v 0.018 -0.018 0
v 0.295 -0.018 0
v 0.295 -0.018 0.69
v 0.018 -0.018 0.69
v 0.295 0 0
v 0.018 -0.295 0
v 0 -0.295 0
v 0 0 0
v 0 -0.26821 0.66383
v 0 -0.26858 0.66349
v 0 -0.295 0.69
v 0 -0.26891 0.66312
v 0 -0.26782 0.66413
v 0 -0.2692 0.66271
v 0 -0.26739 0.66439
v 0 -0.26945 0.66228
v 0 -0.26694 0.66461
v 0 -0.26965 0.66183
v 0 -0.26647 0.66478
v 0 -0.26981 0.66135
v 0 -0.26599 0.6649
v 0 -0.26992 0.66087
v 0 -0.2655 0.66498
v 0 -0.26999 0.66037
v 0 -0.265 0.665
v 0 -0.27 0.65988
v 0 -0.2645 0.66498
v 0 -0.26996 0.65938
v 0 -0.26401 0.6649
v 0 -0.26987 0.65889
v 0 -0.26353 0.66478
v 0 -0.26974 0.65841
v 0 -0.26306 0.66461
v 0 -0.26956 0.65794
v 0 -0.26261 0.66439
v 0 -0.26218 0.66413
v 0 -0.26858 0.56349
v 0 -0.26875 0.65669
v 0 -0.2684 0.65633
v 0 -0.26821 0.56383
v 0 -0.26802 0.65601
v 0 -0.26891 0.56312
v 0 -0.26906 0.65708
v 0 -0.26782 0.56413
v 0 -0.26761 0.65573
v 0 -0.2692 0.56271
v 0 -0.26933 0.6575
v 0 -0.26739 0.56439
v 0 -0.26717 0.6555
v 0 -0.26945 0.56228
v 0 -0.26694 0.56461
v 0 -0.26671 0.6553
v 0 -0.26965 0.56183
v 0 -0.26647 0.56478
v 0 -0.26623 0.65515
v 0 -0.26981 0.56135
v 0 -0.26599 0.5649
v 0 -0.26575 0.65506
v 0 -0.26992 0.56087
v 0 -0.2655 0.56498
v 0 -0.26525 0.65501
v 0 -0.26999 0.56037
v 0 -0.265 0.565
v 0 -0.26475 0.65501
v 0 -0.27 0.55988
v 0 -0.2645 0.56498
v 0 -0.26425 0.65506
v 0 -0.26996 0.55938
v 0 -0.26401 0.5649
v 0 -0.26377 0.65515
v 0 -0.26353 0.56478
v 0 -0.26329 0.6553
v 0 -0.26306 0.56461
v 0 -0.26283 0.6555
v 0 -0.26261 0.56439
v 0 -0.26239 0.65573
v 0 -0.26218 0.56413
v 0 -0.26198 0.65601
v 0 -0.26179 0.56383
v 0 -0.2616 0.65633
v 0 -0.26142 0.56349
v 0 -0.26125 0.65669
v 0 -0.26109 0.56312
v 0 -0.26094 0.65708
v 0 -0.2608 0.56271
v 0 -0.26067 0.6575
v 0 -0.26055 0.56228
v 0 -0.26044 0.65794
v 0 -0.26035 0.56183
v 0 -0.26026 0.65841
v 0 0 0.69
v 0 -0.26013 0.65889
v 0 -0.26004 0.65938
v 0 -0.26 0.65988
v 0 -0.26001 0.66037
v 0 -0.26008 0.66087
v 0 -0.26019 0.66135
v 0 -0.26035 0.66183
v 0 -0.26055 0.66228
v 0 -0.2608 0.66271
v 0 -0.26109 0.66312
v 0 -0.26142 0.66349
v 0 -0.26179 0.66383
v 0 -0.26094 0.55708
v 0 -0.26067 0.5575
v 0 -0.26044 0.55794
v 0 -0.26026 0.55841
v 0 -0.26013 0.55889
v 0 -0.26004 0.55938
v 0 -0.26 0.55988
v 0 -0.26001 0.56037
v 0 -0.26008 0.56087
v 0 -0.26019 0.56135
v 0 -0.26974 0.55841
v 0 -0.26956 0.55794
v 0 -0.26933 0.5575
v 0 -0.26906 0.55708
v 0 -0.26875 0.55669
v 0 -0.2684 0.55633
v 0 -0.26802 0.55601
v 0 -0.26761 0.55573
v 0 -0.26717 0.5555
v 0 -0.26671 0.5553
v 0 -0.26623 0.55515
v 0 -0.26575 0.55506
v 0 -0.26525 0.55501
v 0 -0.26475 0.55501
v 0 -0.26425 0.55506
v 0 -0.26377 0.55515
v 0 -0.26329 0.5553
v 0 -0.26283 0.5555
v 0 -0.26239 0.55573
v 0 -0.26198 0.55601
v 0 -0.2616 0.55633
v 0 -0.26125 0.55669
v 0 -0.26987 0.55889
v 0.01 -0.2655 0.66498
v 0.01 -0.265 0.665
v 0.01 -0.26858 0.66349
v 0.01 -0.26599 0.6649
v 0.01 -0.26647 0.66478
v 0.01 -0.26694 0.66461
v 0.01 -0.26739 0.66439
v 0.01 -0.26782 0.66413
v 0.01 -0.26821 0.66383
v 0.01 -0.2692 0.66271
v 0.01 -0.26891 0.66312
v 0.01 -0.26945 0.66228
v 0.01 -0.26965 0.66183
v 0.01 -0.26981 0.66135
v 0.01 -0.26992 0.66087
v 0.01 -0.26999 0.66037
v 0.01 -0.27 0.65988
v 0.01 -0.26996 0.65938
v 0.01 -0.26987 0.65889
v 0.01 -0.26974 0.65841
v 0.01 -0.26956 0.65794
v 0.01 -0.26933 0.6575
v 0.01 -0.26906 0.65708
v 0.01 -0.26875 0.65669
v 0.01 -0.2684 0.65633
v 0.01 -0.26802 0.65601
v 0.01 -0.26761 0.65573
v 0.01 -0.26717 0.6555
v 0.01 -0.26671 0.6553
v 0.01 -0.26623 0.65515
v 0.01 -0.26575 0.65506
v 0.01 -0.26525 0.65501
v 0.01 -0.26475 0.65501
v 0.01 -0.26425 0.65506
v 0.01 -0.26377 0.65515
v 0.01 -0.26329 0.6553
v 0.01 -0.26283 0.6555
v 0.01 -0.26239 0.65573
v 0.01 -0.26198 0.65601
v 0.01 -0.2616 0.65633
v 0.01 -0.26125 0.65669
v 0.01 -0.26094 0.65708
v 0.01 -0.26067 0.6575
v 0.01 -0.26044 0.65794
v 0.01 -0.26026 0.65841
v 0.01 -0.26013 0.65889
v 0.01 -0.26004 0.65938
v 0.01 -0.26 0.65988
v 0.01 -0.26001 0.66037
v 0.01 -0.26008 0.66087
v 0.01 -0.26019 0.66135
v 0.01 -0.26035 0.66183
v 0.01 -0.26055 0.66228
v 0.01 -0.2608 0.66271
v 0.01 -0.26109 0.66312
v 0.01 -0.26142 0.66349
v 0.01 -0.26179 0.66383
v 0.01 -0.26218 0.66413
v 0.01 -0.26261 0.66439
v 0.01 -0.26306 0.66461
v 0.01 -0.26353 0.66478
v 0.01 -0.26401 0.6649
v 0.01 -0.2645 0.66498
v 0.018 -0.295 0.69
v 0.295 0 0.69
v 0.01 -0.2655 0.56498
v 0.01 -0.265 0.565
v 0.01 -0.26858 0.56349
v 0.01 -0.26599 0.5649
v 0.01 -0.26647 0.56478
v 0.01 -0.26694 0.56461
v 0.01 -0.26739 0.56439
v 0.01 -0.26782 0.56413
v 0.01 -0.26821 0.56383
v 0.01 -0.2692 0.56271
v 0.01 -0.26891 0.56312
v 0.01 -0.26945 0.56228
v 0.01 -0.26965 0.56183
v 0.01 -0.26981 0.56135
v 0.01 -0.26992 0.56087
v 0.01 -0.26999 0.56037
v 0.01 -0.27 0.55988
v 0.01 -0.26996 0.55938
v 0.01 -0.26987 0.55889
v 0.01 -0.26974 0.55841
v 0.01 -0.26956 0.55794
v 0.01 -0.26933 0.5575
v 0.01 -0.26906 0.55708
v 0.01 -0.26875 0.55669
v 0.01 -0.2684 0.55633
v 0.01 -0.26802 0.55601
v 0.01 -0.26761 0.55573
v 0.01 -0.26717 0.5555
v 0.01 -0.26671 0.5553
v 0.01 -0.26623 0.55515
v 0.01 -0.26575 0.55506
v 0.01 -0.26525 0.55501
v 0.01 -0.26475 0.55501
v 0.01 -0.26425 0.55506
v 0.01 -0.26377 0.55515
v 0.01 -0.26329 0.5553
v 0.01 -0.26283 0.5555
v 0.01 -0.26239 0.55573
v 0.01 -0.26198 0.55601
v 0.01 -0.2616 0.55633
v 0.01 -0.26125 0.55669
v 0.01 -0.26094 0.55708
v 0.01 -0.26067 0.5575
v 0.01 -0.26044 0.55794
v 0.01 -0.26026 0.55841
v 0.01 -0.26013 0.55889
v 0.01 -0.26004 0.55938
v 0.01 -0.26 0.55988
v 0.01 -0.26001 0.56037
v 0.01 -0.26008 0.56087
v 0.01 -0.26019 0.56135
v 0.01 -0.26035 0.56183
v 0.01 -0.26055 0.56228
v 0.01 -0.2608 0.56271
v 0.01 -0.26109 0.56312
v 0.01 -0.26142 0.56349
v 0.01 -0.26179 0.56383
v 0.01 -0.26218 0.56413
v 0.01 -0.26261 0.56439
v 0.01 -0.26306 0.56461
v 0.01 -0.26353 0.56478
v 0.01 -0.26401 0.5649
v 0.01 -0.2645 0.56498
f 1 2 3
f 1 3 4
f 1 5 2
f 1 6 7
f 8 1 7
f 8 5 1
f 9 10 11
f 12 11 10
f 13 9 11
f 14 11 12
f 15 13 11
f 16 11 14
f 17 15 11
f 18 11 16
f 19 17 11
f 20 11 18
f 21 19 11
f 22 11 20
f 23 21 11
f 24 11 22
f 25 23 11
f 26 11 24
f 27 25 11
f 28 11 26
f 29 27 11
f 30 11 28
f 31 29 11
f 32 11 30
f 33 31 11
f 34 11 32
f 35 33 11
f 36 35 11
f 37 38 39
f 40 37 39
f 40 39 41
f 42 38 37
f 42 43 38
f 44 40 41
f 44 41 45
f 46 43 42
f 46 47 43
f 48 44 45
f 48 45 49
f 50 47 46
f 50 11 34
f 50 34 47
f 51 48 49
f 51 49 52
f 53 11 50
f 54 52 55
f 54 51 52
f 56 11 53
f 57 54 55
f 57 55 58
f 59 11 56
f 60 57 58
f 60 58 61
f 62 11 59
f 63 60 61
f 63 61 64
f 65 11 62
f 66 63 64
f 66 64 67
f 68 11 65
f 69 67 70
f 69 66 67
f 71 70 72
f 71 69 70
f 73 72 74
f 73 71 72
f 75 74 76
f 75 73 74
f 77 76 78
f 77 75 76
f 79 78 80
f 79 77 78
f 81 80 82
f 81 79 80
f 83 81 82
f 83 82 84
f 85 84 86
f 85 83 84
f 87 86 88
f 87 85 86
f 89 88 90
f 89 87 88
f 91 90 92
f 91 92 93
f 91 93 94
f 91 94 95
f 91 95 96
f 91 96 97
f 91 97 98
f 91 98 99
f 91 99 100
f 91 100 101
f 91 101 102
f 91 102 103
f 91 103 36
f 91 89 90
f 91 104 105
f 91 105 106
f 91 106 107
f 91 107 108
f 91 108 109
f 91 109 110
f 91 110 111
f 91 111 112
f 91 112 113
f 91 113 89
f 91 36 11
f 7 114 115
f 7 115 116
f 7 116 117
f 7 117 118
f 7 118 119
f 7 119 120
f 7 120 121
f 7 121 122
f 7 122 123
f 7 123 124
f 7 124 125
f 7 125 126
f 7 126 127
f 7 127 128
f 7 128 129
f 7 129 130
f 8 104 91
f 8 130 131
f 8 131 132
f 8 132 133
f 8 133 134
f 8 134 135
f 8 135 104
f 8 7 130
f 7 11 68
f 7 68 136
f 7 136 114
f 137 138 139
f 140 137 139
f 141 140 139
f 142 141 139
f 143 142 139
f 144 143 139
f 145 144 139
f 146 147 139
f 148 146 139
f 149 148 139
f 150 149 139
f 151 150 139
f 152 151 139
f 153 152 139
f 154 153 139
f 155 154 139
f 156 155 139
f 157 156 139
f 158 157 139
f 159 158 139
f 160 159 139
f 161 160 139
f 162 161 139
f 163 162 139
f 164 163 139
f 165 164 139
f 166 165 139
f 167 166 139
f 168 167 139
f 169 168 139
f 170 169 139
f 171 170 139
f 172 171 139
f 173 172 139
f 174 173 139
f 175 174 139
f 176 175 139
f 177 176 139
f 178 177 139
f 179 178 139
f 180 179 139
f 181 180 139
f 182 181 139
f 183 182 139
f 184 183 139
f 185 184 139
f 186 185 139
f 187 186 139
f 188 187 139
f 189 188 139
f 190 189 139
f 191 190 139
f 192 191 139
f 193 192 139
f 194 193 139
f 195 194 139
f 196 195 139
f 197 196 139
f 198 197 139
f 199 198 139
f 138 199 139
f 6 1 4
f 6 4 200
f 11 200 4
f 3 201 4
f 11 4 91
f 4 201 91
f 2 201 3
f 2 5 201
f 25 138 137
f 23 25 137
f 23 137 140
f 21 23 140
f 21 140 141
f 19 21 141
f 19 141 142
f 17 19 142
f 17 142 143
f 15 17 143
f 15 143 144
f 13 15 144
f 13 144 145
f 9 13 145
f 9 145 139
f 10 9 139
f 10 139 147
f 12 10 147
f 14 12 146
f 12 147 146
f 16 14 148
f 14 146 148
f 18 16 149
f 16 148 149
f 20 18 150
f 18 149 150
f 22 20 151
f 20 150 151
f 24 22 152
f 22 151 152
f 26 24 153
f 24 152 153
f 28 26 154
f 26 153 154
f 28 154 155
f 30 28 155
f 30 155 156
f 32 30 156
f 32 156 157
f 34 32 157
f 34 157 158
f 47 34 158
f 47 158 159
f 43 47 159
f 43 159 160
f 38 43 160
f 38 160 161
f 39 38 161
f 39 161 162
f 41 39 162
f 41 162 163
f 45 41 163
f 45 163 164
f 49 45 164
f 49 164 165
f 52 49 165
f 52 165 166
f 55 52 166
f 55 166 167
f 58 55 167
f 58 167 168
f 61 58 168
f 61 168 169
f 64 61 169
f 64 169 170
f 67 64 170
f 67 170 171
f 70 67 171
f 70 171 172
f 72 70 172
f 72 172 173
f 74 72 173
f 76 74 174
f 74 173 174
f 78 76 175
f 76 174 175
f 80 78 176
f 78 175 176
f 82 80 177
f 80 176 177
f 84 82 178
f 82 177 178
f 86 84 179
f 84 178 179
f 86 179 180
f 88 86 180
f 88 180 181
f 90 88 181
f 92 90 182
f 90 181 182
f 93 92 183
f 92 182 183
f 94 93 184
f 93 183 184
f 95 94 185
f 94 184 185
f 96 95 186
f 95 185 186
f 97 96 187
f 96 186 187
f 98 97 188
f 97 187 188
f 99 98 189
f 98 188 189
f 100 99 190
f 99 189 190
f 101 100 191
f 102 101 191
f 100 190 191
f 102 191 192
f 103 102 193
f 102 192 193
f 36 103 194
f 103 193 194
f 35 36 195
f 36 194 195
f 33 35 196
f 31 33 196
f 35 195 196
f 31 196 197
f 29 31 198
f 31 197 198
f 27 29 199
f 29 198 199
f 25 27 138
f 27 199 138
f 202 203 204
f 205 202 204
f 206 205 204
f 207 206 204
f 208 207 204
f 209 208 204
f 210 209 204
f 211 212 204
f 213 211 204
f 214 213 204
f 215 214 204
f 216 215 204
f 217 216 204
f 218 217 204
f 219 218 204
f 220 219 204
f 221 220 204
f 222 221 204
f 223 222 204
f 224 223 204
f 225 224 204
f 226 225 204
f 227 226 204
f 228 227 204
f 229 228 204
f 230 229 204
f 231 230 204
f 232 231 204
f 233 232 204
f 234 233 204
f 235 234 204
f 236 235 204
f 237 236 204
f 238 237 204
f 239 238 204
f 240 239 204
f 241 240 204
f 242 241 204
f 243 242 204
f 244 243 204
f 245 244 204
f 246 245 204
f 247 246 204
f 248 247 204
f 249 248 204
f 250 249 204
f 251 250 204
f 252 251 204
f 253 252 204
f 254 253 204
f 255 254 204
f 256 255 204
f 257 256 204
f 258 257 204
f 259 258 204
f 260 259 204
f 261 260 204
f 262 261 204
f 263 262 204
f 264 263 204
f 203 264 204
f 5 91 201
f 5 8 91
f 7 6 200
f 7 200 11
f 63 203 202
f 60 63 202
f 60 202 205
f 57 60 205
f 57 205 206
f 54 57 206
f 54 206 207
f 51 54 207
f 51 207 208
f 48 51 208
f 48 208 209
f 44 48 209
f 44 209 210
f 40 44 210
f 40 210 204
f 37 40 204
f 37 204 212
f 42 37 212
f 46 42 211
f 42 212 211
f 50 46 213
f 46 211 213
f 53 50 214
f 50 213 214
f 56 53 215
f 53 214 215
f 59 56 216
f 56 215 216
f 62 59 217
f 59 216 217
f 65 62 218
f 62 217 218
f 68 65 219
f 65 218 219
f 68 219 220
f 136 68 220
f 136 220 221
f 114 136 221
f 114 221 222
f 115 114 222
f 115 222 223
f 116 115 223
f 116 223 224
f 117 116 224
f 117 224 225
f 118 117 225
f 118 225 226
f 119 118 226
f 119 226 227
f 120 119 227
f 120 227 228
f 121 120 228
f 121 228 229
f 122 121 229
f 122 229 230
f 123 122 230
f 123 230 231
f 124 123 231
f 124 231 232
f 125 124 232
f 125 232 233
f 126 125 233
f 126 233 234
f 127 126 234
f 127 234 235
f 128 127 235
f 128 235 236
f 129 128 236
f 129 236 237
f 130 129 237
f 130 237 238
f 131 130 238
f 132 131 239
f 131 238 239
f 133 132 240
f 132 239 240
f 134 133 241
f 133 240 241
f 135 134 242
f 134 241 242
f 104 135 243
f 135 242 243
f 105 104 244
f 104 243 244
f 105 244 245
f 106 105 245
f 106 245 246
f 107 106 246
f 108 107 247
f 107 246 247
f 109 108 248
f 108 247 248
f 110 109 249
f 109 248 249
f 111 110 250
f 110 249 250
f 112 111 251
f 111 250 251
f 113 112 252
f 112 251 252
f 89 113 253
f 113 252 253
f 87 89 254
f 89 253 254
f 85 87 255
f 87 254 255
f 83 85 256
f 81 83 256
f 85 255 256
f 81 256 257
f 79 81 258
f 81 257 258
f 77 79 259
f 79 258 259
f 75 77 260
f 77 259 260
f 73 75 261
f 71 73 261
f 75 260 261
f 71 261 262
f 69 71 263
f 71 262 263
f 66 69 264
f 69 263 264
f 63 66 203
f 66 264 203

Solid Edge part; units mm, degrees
sketch "Sketch1" plane through (0, 0, 0) normal (0, 0, 1) x (1, 0, 0)
  line L0 (0.295, 0) -> (0.295, -0.018)
  line L1 (0.295, -0.018) -> (0.018, -0.018)
  line L2 (0.018, -0.018) -> (0.018, -0.295)
  line L3 (0.018, -0.295) -> (0, -0.295)
  line L4 (0, -0.295) -> (0, 0)
  line L5 (0, 0) -> (0.295, 0)
  dimension "D1" = 0.295
  dimension "D2" = 0.018
extrude "Protrusion1" add sketch "Sketch1" along normal blind 0.69
hole "Bohrung_1" at (0, -0.265, 0.56) direction (1, 0, 0) diameter 0.01 depth 0.01
hole "Hole1" at (0, -0.265, 0.66) direction (1, 0, 0) diameter 0.01 depth 0.01
